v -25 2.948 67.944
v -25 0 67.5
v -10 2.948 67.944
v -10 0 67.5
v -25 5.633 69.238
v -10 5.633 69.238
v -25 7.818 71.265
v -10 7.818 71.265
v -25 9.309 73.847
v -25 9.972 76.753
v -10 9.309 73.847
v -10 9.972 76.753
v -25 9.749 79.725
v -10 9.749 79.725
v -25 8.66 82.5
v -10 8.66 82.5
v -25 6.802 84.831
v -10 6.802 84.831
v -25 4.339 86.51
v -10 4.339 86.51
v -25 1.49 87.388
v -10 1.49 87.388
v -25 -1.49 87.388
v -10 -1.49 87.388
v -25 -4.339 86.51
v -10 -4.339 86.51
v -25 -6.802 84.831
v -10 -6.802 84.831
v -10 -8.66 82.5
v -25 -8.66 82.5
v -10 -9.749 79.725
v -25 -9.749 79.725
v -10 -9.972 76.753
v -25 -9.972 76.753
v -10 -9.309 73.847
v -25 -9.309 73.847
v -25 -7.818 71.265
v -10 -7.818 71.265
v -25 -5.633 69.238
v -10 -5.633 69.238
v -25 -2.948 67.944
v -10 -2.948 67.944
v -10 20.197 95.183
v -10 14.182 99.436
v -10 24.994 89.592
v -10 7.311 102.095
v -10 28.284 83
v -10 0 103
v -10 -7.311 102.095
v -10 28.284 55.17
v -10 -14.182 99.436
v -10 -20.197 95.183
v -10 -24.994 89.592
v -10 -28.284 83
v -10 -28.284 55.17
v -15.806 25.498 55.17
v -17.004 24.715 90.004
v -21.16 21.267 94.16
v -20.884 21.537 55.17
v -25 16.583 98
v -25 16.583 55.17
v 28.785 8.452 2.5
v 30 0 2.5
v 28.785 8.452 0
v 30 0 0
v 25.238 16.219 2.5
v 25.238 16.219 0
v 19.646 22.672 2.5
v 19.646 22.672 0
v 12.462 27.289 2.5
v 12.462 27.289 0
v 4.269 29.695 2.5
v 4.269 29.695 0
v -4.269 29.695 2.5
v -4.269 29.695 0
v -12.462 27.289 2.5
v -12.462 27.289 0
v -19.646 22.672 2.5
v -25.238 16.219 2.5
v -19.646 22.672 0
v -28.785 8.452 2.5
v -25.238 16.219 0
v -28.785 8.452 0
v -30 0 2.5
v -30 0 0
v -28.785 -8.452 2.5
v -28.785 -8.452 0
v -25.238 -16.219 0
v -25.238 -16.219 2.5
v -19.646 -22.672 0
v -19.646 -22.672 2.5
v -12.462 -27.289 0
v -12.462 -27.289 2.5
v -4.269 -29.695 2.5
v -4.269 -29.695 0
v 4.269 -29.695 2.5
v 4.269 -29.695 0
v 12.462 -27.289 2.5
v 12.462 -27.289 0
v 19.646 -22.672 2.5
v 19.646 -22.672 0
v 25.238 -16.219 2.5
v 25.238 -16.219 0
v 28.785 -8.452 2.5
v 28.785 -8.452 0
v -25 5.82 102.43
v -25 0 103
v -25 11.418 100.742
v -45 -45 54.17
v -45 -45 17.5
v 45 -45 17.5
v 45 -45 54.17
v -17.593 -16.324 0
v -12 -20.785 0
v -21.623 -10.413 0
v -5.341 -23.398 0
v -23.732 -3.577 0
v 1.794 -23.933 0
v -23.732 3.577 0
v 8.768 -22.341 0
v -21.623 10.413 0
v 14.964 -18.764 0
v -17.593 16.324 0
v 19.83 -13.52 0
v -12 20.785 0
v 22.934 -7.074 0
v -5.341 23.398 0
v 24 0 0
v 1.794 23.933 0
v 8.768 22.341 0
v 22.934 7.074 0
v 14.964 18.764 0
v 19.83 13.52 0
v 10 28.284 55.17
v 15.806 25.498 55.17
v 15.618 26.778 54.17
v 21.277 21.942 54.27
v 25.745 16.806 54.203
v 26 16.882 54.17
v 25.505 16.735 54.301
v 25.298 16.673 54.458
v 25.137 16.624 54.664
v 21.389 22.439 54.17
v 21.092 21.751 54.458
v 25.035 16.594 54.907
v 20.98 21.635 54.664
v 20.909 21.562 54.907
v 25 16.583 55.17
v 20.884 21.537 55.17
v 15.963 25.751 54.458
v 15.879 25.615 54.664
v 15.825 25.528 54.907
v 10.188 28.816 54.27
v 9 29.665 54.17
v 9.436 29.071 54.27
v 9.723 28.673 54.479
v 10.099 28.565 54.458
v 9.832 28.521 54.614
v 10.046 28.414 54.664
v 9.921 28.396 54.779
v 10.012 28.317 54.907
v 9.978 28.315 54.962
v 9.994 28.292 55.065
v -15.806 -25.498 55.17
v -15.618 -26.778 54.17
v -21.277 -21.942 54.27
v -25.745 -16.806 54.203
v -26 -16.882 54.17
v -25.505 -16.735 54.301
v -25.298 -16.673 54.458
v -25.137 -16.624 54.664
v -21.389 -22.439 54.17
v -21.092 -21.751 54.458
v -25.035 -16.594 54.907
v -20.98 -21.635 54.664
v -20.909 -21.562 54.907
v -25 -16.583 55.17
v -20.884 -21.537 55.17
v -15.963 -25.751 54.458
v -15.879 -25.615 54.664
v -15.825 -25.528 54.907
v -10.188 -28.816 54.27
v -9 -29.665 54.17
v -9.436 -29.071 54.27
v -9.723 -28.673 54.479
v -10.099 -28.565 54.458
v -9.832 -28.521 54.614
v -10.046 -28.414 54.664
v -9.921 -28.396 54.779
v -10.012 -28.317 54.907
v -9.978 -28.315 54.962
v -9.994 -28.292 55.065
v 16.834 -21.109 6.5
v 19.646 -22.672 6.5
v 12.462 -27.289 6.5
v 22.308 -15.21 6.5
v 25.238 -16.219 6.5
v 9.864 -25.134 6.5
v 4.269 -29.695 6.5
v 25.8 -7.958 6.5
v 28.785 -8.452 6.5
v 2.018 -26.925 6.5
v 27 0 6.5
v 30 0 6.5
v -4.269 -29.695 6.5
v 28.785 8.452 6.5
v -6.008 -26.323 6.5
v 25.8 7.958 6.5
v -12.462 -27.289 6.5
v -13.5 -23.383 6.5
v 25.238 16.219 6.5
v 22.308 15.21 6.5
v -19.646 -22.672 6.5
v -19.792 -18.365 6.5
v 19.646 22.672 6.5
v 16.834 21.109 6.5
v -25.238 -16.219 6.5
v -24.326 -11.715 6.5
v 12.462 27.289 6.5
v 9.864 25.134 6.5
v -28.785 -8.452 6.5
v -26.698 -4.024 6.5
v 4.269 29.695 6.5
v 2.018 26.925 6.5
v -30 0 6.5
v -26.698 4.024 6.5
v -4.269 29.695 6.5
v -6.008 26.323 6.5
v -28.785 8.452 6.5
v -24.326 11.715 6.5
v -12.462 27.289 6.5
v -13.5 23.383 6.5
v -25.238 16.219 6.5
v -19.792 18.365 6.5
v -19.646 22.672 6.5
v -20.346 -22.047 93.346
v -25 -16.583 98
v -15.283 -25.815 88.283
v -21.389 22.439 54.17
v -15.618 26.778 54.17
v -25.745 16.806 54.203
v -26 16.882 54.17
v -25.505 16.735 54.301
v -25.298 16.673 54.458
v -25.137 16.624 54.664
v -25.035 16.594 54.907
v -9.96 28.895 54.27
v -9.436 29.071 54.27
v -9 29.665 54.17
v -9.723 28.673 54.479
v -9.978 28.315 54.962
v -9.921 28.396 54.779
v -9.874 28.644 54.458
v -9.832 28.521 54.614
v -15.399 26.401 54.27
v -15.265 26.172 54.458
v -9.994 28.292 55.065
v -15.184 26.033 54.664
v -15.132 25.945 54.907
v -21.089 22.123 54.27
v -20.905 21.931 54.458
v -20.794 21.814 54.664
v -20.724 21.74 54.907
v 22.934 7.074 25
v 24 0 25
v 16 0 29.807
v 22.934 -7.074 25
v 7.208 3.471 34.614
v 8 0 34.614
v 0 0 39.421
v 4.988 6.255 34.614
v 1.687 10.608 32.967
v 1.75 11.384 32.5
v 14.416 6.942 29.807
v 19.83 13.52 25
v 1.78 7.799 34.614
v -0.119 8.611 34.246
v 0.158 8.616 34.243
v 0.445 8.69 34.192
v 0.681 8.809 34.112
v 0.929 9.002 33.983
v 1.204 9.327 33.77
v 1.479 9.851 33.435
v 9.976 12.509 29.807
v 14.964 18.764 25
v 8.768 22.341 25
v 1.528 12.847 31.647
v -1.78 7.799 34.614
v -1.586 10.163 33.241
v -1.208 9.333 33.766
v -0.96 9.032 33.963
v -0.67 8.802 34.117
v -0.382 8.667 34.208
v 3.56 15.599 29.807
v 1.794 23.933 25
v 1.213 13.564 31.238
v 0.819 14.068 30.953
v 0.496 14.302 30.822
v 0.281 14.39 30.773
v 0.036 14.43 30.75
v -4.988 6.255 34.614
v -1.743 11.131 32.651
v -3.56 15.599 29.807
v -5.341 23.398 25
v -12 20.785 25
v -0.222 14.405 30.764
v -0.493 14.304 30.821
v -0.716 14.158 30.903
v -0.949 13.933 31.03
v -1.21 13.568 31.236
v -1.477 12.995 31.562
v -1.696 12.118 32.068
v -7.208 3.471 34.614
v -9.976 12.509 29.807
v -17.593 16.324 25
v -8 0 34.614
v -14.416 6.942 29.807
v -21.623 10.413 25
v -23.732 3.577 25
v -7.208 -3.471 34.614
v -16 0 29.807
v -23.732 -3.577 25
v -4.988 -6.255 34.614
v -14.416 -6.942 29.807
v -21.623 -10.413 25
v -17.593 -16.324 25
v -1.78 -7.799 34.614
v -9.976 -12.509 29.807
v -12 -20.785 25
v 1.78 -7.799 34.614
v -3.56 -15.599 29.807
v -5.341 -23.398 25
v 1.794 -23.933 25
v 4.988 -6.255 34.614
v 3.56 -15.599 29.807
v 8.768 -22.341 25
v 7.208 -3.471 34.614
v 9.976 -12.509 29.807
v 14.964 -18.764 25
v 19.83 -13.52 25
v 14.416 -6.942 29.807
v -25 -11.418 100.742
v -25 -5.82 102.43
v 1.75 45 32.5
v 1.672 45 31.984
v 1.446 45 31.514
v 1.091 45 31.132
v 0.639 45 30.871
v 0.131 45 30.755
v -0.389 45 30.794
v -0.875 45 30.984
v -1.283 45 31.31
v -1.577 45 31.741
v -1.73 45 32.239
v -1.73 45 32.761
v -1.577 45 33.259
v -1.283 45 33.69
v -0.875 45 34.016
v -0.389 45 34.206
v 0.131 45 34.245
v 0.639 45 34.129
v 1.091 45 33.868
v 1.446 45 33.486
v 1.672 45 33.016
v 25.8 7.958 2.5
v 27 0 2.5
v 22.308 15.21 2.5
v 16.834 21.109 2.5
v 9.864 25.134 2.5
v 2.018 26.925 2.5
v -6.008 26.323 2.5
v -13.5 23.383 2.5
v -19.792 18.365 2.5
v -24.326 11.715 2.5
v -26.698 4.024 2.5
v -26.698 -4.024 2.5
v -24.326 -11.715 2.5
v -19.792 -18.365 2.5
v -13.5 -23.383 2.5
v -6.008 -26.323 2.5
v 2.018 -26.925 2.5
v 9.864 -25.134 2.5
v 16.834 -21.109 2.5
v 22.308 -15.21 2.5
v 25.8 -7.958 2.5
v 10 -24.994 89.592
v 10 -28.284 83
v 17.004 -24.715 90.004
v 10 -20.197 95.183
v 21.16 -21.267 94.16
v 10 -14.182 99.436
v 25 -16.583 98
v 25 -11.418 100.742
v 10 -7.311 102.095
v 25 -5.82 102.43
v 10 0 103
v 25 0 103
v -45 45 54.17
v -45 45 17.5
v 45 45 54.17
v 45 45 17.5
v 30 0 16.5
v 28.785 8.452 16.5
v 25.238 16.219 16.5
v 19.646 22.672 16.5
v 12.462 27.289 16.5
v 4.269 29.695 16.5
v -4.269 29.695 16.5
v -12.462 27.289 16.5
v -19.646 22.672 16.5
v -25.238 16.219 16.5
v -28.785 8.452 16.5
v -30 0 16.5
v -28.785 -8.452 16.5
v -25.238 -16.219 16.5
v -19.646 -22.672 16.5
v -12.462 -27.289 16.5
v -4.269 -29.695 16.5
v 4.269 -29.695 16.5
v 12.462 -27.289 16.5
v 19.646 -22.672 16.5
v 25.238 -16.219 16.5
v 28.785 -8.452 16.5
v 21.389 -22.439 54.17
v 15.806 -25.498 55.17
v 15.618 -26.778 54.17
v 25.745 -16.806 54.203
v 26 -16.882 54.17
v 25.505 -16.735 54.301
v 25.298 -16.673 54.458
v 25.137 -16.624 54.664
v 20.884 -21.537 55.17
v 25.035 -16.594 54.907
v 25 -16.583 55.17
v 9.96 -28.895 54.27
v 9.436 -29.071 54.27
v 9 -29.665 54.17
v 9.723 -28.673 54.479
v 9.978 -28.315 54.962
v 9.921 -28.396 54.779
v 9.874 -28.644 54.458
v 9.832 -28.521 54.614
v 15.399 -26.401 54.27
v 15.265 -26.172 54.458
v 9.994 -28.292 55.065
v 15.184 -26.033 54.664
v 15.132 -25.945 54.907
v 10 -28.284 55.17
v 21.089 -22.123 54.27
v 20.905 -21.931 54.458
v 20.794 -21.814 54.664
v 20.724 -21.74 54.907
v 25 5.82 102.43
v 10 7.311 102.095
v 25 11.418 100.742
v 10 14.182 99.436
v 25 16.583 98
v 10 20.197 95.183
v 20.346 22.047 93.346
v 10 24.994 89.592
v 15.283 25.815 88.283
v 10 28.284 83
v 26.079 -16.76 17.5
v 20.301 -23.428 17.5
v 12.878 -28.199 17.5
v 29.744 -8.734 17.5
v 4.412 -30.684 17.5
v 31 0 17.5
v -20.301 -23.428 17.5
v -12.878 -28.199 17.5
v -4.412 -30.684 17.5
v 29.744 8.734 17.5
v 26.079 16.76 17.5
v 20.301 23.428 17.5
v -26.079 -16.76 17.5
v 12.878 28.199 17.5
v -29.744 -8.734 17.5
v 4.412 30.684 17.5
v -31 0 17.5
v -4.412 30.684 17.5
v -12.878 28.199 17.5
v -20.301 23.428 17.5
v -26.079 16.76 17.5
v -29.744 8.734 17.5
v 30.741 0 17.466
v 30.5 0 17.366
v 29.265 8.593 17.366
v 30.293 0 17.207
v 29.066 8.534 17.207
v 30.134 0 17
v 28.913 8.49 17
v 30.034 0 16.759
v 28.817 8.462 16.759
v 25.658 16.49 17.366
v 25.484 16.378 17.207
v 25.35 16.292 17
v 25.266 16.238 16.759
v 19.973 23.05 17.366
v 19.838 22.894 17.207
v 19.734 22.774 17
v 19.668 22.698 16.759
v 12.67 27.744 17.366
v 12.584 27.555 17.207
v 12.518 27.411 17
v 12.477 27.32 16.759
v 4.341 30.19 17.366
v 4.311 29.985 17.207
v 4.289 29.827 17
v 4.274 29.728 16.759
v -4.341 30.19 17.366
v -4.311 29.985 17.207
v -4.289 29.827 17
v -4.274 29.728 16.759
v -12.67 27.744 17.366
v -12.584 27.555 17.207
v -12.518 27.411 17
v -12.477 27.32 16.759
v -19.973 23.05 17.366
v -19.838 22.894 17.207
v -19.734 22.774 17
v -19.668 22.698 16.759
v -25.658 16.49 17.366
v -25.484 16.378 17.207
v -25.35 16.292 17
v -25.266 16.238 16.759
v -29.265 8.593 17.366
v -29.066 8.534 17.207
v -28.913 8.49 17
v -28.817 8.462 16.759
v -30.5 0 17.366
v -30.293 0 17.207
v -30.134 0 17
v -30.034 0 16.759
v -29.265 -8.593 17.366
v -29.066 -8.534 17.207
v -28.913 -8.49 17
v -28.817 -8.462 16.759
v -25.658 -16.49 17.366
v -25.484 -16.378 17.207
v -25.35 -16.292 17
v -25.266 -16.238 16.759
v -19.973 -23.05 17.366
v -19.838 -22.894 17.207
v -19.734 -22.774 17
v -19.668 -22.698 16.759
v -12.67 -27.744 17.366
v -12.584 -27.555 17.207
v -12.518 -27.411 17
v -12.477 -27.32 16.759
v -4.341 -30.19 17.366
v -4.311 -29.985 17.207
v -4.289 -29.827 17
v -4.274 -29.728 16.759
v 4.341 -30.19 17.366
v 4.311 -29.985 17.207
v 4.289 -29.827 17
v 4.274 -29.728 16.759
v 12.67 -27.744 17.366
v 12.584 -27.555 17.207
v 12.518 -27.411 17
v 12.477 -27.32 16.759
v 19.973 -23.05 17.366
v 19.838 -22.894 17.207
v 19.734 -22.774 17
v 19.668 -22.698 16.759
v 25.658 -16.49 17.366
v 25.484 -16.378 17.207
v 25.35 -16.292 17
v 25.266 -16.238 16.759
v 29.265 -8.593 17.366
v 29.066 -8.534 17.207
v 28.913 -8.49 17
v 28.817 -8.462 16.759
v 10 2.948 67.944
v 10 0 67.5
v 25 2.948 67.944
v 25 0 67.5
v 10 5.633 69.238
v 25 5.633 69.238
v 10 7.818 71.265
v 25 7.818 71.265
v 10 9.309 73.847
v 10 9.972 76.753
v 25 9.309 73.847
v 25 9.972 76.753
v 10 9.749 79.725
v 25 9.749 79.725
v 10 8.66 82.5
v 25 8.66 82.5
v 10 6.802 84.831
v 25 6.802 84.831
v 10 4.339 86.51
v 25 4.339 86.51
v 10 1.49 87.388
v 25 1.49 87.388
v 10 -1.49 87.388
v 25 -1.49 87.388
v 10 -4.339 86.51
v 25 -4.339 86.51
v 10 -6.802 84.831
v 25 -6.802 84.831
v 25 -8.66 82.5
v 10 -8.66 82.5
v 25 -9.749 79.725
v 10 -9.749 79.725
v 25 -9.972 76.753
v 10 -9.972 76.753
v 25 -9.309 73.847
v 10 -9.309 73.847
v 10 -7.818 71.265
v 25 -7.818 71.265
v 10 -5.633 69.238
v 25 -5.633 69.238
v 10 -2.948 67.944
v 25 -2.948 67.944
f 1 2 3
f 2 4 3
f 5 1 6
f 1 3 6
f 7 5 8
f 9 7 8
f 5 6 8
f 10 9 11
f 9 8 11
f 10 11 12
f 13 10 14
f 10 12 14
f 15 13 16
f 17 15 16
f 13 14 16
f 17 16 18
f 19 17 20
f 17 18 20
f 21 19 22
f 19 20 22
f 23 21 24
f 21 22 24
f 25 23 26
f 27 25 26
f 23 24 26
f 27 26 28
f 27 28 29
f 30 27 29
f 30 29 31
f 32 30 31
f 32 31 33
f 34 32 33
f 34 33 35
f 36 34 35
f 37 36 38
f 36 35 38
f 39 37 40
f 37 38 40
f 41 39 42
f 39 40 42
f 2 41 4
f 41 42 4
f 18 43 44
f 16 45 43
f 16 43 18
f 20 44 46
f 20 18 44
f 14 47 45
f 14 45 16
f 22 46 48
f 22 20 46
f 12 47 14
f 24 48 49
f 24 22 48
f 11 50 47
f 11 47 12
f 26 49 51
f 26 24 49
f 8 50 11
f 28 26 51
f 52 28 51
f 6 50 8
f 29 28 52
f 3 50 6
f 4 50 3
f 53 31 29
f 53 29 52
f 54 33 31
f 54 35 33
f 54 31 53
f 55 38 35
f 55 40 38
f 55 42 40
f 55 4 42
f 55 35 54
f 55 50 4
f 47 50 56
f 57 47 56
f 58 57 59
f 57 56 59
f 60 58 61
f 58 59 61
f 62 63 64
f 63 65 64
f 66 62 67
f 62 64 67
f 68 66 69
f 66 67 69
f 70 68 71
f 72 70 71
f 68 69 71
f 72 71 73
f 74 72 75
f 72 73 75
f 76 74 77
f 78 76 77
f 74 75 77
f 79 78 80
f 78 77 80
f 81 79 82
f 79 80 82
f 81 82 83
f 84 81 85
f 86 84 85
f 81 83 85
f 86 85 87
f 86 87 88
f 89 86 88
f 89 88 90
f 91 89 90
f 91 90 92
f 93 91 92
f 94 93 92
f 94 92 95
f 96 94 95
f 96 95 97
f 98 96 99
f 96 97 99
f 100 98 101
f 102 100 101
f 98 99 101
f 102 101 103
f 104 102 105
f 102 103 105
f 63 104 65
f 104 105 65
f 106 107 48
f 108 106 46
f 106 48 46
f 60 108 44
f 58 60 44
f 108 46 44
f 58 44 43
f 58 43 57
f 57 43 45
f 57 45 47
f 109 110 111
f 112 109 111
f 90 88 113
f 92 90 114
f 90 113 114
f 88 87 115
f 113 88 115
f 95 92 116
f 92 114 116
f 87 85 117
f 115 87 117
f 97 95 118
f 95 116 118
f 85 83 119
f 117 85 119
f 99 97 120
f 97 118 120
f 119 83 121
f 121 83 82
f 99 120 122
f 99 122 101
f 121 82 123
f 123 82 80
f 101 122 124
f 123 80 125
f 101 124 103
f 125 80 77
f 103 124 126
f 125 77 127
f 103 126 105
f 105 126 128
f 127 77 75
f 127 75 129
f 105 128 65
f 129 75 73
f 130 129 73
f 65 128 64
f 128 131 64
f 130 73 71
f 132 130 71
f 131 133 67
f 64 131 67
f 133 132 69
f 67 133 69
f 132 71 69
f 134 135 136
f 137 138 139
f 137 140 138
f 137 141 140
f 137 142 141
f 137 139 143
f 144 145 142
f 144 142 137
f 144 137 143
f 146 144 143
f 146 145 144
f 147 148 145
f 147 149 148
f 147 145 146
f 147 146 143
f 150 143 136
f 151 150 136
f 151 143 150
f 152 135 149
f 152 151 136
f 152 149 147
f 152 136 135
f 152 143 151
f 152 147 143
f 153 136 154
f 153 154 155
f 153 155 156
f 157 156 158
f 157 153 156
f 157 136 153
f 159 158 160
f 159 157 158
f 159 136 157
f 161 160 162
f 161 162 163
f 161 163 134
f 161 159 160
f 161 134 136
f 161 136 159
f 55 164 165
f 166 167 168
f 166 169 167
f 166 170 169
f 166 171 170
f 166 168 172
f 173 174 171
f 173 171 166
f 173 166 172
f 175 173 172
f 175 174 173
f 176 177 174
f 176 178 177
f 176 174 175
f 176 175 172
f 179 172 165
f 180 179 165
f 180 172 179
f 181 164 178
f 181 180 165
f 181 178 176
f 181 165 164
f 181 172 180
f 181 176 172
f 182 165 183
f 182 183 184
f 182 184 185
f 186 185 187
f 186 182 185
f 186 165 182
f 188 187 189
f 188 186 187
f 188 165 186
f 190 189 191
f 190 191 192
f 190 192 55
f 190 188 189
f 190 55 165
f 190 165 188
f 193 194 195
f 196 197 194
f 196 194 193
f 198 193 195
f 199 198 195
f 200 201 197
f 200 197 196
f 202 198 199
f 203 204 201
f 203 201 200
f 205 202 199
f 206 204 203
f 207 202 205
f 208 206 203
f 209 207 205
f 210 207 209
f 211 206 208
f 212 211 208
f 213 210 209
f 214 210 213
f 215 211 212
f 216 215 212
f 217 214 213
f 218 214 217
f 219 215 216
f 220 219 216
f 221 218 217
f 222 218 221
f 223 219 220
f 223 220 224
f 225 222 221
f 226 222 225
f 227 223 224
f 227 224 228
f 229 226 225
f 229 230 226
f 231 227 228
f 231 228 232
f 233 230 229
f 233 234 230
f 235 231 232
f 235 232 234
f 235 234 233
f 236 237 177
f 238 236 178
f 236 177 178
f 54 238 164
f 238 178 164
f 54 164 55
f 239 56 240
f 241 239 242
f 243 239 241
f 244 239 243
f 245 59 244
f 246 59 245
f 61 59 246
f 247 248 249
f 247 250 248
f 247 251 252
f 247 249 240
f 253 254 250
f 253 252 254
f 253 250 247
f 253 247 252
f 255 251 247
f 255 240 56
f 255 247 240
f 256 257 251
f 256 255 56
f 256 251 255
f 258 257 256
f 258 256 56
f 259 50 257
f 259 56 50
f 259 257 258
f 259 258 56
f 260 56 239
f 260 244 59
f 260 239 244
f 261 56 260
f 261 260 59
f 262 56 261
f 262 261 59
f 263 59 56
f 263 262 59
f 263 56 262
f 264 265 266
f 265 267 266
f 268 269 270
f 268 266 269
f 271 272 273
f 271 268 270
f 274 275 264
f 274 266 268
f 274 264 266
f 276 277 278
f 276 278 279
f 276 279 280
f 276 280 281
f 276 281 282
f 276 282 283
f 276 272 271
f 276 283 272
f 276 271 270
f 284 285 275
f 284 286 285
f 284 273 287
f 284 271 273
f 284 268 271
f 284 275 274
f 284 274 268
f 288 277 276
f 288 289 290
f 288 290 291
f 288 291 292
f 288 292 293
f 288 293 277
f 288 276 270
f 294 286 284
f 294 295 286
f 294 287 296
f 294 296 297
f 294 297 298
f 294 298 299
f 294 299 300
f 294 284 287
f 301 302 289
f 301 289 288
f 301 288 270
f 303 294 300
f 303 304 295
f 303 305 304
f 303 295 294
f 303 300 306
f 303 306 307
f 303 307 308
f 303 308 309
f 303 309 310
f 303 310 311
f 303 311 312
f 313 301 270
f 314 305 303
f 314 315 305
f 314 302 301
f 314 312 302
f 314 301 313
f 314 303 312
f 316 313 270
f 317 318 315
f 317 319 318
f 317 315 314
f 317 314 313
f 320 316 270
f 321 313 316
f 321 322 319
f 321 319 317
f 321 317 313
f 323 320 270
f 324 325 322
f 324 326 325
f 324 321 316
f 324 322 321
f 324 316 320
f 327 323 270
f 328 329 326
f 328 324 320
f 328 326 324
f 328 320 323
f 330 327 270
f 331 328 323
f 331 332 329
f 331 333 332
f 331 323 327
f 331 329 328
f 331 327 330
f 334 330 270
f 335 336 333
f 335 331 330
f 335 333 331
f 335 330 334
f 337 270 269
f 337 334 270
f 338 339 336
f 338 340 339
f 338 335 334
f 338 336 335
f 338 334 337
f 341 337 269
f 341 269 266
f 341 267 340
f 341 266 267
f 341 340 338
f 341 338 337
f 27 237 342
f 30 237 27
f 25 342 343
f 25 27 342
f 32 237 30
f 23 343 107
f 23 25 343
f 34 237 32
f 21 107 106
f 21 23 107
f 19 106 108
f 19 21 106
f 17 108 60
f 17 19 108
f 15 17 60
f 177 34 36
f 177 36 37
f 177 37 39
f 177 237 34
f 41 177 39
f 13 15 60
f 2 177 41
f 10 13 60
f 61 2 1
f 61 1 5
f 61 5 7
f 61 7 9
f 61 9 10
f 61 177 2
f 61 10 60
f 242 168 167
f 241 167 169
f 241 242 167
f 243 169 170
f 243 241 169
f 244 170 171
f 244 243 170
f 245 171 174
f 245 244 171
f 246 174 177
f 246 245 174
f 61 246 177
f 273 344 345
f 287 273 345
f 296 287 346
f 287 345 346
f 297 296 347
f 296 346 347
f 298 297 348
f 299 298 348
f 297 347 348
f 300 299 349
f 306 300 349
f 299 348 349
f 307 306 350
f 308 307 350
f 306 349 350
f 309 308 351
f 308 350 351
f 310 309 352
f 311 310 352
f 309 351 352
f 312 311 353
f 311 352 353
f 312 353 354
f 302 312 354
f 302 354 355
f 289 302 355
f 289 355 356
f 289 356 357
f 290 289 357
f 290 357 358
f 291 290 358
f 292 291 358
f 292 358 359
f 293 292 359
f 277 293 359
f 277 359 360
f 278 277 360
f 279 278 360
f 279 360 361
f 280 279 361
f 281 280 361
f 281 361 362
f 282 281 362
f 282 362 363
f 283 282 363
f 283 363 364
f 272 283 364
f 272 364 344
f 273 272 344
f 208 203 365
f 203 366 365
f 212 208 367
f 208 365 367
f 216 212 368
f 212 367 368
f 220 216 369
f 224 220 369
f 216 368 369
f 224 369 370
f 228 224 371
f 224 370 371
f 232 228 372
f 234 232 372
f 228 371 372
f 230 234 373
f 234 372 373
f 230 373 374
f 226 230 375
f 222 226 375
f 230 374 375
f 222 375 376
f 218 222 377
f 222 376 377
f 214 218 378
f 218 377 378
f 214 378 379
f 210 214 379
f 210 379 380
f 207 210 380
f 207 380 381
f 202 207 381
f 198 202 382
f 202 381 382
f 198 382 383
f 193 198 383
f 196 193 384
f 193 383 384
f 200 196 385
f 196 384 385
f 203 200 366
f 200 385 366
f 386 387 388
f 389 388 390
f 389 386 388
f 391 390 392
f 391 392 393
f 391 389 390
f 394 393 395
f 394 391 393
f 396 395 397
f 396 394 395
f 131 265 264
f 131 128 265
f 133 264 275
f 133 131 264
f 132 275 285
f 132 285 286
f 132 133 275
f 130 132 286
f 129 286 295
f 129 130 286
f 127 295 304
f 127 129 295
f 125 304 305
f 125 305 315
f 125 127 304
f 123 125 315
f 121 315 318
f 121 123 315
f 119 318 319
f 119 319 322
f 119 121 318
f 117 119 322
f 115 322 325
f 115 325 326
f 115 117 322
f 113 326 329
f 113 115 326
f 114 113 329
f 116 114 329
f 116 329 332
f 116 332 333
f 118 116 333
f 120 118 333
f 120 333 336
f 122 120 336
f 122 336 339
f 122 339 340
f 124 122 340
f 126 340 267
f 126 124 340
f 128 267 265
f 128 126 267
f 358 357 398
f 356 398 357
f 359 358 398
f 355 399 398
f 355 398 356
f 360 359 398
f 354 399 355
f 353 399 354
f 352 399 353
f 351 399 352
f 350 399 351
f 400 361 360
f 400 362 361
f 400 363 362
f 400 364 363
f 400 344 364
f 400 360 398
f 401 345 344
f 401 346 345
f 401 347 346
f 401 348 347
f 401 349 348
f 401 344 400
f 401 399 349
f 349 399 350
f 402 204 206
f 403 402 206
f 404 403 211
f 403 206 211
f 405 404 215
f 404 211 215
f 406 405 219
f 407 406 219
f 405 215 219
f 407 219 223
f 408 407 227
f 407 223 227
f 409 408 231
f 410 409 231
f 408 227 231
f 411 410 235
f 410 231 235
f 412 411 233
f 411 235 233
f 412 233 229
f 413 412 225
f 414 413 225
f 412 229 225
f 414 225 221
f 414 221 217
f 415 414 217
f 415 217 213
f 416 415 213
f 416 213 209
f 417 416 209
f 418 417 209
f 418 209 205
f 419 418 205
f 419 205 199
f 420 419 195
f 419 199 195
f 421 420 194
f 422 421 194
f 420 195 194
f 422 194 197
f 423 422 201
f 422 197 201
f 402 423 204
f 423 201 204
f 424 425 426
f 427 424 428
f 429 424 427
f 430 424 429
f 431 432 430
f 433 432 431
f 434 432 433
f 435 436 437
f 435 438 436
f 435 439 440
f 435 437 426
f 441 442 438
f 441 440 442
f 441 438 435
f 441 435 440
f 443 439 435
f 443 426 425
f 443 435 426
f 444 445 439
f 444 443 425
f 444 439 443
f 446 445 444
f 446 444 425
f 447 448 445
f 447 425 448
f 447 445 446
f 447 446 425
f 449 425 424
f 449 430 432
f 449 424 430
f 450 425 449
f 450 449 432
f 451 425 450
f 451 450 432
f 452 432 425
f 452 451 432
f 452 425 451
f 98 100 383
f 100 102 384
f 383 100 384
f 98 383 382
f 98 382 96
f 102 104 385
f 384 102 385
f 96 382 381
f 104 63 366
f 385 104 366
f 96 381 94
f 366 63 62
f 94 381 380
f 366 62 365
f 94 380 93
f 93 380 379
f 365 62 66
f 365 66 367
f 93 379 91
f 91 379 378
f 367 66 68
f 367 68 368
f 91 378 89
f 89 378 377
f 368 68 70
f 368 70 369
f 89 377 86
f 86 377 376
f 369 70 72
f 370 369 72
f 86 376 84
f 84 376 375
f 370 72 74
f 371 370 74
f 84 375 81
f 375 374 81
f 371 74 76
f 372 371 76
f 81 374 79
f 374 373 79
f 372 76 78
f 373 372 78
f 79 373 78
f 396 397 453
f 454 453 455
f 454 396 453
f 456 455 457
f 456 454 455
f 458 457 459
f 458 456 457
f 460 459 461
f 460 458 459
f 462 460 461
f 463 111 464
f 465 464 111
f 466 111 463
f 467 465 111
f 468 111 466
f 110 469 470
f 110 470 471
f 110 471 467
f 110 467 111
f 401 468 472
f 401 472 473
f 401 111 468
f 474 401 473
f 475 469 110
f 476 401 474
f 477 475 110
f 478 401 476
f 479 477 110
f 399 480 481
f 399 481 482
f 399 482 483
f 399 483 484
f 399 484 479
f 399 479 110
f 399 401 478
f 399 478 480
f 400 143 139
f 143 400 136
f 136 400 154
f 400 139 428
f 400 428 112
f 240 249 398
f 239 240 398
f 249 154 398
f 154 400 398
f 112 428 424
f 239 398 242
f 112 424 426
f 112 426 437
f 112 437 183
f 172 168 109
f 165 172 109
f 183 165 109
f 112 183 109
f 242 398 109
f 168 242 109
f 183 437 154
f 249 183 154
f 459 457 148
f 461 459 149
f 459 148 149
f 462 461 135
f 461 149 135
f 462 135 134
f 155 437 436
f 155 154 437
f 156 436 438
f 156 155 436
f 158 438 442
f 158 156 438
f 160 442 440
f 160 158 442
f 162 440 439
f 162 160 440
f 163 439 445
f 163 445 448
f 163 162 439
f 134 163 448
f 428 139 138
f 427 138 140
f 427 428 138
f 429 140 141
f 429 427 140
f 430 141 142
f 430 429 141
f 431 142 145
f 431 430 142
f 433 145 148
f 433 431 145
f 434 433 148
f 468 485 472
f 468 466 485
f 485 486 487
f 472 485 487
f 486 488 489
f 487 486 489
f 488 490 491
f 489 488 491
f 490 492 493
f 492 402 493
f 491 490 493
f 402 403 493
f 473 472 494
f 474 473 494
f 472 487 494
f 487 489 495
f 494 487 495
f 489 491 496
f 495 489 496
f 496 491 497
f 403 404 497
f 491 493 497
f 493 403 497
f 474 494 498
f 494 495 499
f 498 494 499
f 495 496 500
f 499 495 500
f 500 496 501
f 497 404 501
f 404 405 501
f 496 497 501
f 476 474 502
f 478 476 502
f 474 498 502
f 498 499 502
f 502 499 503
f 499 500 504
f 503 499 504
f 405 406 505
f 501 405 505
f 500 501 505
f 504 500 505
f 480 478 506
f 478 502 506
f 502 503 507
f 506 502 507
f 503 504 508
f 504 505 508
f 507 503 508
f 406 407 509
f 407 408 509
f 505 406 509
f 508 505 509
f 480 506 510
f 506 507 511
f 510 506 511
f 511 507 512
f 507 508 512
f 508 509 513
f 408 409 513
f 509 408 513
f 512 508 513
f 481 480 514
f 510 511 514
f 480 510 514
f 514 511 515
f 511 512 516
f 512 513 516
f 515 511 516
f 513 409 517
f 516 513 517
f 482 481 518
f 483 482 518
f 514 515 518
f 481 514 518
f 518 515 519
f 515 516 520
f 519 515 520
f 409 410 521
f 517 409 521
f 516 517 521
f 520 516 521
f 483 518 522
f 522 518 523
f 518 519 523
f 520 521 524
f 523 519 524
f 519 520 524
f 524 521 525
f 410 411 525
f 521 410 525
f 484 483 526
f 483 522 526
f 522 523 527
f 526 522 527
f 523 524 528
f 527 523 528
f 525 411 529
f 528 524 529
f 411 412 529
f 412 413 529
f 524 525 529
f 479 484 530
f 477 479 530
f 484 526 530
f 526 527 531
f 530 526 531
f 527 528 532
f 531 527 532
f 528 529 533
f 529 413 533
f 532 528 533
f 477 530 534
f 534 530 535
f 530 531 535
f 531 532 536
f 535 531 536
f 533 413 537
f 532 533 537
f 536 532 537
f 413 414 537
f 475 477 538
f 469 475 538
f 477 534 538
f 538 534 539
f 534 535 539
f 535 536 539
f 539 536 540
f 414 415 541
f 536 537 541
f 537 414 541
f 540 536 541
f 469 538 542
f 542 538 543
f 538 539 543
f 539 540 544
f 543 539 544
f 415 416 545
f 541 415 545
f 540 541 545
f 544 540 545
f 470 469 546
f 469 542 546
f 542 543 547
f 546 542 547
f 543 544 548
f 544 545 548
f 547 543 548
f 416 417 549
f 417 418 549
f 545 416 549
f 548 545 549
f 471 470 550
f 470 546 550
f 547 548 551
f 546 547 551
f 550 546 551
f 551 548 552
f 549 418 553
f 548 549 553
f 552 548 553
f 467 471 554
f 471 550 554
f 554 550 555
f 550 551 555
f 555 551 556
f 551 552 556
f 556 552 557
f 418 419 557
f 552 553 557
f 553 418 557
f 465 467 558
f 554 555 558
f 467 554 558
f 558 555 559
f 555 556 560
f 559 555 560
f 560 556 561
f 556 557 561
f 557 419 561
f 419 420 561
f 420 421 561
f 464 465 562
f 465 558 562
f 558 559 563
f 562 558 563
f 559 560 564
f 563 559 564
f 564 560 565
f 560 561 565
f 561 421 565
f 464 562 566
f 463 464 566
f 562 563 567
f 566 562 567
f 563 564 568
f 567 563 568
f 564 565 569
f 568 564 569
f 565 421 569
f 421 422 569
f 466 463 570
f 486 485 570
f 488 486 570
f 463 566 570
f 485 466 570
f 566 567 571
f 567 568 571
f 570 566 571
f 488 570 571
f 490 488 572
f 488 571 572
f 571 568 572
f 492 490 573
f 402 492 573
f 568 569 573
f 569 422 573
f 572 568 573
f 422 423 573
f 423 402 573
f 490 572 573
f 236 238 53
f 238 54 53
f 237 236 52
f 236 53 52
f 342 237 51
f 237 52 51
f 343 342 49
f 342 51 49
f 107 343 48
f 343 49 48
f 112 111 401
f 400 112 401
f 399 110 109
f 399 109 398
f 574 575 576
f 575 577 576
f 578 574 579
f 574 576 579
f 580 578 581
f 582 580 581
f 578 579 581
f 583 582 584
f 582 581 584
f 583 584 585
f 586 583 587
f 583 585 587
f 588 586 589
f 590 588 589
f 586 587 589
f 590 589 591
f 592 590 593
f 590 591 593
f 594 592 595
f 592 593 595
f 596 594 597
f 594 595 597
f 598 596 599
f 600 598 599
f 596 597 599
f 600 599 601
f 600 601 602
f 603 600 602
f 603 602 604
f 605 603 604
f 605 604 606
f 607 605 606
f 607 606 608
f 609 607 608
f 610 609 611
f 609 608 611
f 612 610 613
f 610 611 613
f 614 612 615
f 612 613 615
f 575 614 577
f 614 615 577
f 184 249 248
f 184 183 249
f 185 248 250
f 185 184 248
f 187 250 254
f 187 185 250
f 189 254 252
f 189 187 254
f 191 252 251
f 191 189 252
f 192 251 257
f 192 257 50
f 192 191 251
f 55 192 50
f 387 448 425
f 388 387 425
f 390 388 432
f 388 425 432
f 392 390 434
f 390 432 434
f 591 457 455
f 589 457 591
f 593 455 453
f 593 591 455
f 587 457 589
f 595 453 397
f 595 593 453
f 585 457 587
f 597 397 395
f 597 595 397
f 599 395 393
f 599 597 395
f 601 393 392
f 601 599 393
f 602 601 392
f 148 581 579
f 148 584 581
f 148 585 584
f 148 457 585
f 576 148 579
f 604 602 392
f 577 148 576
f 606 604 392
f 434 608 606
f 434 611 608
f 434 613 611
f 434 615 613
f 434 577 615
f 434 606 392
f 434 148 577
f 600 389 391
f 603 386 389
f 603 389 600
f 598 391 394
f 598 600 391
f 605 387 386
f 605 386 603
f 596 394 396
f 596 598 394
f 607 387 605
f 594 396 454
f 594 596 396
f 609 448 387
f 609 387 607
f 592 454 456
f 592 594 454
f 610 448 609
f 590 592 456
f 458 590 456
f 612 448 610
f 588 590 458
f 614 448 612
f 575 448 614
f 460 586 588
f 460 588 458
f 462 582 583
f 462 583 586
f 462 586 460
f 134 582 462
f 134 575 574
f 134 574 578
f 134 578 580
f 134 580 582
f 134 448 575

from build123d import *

# Parameters (mm, degrees)
SKETCH2_W               = 90
SKETCH2_H               = 90
BOSS_EXTRUDE1_DEPTH     = 103
SKETCH4_W               = 24
SKETCH4_H               = 25
SKETCH4_W_2             = 40
SKETCH4_H_2             = 17.5
SKETCH4_W_3             = 3
SKETCH4_H_3             = 4
SKETCH5_R               = 10
CUT_EXTRUDE1_DEPTH      = 46
CUT_EXTRUDE1_DEPTH_BACK = 46
SKETCH6_W               = 80.499612835
SKETCH6_H               = 43.101198191
CUT_EXTRUDE2_DEPTH      = 46
CUT_EXTRUDE2_DEPTH_BACK = 46
CUT_EXTRUDE3_DEPTH      = 103
CUT_EXTRUDE4_REACH      = 92
SKETCH10_R              = 1.75
FILLET1_R               = 1


with BuildPart() as part:
    # Sketch2 → Boss-Extrude1 (new body)
    with BuildSketch(Plane.XY):
        Rectangle(SKETCH2_W, SKETCH2_H)
    extrude(amount=BOSS_EXTRUDE1_DEPTH)

    # Sketch4 → Cut-Revolve2 (revolve, cut)
    with BuildSketch(Plane(origin=(0, 0, 0), x_dir=(1, 0, 0), z_dir=(0, 1, 0))):
        with Locations((12, -12.5)):
            Rectangle(SKETCH4_W, SKETCH4_H)
        Polygon((0, -25), (0, -39.420654857), (24, -25), align=None)
        with Locations((50, -8.75)):
            Rectangle(SKETCH4_W_2, SKETCH4_H_2)
        with Locations((28.5, -4.5)):
            Rectangle(SKETCH4_W_3, SKETCH4_H_3)
    revolve(axis=Axis((0, 0, 0), (0, 0, 1)), mode=Mode.SUBTRACT)

    # Sketch5 → Cut-Extrude1 (cut, two sides)
    with BuildSketch(Plane(origin=(0, 0, 0), x_dir=(0, 0, -1), z_dir=(1, 0, 0))) as cut_extrude1_sk:
        with Locations((-77.5, 0)):
            Circle(SKETCH5_R)
    extrude(amount=CUT_EXTRUDE1_DEPTH, mode=Mode.SUBTRACT)
    extrude(cut_extrude1_sk.sketch, amount=-CUT_EXTRUDE1_DEPTH_BACK, mode=Mode.SUBTRACT)

    # Sketch6 → Cut-Revolve3 (revolve, cut)
    with BuildSketch(Plane(origin=(0, 0, 0), x_dir=(0, 0, -1), z_dir=(1, 0, 0))):
        with Locations((-94.419607416, 51.550599096)):
            Rectangle(SKETCH6_W, SKETCH6_H)
    revolve(axis=Axis((0, 0, 0), (0, 0, 1)), mode=Mode.SUBTRACT)

    # Sketch7 → Cut-Extrude2 (cut, two sides)
    with BuildSketch(Plane(origin=(0, 0, 0), x_dir=(0, 0, -1), z_dir=(1, 0, 0))) as cut_extrude2_sk:
        with BuildLine():
            Line((-103, 30), (-103, 0))
            ThreePointArc((-103, 0), (-95.748626332, 19.557607216), (-77.5, 29.6605799))
            Line((-77.5, 29.6605799), (-77.5, 30))
            Line((-77.5, 30), (-103, 30))
        make_face()
        with BuildLine():
            ThreePointArc((-77.5, -29.6605799), (-95.748626332, -19.557607216), (-103, 0))
            Line((-103, 0), (-103, -30))
            Line((-103, -30), (-77.5, -30))
            Line((-77.5, -30), (-77.5, -29.6605799))
        make_face()
    extrude(amount=CUT_EXTRUDE2_DEPTH, mode=Mode.SUBTRACT)
    extrude(cut_extrude2_sk.sketch, amount=-CUT_EXTRUDE2_DEPTH_BACK, mode=Mode.SUBTRACT)

    # Sketch8 → Cut-Extrude3 (cut)
    with BuildSketch(Plane.XY.offset(54.169800998)):
        with BuildLine():
            ThreePointArc((30, 0), (28.722813233, 8.660254038), (25, 16.583123952))
            Line((25, 16.583123952), (25, -16.583123952))
            ThreePointArc((25, -16.583123952), (28.722813233, -8.660254038), (30, 0))
        make_face()
        with BuildLine():
            Line((-25, -16.583123952), (-25, 16.583123952))
            ThreePointArc((-25, 16.583123952), (-30, 0), (-25, -16.583123952))
        make_face()
        with BuildLine():
            ThreePointArc((10, 28.284271247), (0, 30), (-10, 28.284271247))
            Line((-10, 28.284271247), (-10, -28.284271247))
            ThreePointArc((-10, -28.284271247), (0, -30), (10, -28.284271247))
            Line((10, -28.284271247), (10, 28.284271247))
        make_face()
    extrude(amount=CUT_EXTRUDE3_DEPTH, mode=Mode.SUBTRACT)

    # Sketch10 → Cut-Extrude4 (cut, up to next)
    with BuildSketch(Plane(origin=(0, 45, 0), x_dir=(1, 0, 0), z_dir=(0, 1, 0)), mode=Mode.PRIVATE) as cut_extrude4_sk1:
        with Locations((0, -32.5)):
            Circle(SKETCH10_R)
    cut_extrude4_tool1 = extrude(cut_extrude4_sk1.sketch, amount=-CUT_EXTRUDE4_REACH, mode=Mode.PRIVATE) & part.part
    add(cut_extrude4_tool1.solids().sort_by_distance((0, 45, 32.5))[0], mode=Mode.SUBTRACT)

    # Fillet1
    fillet1_edges = [part.edges().sort_by_distance(p)[0] for p in [
        (18.452078799, 23.654191764, 54.169800998),
        (18.452078799, -23.654191764, 54.169800998),
        (-18.452078799, -23.654191764, 54.169800998),
        (25, 0, 54.169800998),
        (-25, 0, 54.169800998),
        (-10, 0, 54.169800998),
        (10, 0, 54.169800998),
        (-30, 0, 17.5),
        (-18.452078799, 23.654191764, 54.169800998),
    ]]
    fillet(fillet1_edges, radius=FILLET1_R)


solid = part.part
